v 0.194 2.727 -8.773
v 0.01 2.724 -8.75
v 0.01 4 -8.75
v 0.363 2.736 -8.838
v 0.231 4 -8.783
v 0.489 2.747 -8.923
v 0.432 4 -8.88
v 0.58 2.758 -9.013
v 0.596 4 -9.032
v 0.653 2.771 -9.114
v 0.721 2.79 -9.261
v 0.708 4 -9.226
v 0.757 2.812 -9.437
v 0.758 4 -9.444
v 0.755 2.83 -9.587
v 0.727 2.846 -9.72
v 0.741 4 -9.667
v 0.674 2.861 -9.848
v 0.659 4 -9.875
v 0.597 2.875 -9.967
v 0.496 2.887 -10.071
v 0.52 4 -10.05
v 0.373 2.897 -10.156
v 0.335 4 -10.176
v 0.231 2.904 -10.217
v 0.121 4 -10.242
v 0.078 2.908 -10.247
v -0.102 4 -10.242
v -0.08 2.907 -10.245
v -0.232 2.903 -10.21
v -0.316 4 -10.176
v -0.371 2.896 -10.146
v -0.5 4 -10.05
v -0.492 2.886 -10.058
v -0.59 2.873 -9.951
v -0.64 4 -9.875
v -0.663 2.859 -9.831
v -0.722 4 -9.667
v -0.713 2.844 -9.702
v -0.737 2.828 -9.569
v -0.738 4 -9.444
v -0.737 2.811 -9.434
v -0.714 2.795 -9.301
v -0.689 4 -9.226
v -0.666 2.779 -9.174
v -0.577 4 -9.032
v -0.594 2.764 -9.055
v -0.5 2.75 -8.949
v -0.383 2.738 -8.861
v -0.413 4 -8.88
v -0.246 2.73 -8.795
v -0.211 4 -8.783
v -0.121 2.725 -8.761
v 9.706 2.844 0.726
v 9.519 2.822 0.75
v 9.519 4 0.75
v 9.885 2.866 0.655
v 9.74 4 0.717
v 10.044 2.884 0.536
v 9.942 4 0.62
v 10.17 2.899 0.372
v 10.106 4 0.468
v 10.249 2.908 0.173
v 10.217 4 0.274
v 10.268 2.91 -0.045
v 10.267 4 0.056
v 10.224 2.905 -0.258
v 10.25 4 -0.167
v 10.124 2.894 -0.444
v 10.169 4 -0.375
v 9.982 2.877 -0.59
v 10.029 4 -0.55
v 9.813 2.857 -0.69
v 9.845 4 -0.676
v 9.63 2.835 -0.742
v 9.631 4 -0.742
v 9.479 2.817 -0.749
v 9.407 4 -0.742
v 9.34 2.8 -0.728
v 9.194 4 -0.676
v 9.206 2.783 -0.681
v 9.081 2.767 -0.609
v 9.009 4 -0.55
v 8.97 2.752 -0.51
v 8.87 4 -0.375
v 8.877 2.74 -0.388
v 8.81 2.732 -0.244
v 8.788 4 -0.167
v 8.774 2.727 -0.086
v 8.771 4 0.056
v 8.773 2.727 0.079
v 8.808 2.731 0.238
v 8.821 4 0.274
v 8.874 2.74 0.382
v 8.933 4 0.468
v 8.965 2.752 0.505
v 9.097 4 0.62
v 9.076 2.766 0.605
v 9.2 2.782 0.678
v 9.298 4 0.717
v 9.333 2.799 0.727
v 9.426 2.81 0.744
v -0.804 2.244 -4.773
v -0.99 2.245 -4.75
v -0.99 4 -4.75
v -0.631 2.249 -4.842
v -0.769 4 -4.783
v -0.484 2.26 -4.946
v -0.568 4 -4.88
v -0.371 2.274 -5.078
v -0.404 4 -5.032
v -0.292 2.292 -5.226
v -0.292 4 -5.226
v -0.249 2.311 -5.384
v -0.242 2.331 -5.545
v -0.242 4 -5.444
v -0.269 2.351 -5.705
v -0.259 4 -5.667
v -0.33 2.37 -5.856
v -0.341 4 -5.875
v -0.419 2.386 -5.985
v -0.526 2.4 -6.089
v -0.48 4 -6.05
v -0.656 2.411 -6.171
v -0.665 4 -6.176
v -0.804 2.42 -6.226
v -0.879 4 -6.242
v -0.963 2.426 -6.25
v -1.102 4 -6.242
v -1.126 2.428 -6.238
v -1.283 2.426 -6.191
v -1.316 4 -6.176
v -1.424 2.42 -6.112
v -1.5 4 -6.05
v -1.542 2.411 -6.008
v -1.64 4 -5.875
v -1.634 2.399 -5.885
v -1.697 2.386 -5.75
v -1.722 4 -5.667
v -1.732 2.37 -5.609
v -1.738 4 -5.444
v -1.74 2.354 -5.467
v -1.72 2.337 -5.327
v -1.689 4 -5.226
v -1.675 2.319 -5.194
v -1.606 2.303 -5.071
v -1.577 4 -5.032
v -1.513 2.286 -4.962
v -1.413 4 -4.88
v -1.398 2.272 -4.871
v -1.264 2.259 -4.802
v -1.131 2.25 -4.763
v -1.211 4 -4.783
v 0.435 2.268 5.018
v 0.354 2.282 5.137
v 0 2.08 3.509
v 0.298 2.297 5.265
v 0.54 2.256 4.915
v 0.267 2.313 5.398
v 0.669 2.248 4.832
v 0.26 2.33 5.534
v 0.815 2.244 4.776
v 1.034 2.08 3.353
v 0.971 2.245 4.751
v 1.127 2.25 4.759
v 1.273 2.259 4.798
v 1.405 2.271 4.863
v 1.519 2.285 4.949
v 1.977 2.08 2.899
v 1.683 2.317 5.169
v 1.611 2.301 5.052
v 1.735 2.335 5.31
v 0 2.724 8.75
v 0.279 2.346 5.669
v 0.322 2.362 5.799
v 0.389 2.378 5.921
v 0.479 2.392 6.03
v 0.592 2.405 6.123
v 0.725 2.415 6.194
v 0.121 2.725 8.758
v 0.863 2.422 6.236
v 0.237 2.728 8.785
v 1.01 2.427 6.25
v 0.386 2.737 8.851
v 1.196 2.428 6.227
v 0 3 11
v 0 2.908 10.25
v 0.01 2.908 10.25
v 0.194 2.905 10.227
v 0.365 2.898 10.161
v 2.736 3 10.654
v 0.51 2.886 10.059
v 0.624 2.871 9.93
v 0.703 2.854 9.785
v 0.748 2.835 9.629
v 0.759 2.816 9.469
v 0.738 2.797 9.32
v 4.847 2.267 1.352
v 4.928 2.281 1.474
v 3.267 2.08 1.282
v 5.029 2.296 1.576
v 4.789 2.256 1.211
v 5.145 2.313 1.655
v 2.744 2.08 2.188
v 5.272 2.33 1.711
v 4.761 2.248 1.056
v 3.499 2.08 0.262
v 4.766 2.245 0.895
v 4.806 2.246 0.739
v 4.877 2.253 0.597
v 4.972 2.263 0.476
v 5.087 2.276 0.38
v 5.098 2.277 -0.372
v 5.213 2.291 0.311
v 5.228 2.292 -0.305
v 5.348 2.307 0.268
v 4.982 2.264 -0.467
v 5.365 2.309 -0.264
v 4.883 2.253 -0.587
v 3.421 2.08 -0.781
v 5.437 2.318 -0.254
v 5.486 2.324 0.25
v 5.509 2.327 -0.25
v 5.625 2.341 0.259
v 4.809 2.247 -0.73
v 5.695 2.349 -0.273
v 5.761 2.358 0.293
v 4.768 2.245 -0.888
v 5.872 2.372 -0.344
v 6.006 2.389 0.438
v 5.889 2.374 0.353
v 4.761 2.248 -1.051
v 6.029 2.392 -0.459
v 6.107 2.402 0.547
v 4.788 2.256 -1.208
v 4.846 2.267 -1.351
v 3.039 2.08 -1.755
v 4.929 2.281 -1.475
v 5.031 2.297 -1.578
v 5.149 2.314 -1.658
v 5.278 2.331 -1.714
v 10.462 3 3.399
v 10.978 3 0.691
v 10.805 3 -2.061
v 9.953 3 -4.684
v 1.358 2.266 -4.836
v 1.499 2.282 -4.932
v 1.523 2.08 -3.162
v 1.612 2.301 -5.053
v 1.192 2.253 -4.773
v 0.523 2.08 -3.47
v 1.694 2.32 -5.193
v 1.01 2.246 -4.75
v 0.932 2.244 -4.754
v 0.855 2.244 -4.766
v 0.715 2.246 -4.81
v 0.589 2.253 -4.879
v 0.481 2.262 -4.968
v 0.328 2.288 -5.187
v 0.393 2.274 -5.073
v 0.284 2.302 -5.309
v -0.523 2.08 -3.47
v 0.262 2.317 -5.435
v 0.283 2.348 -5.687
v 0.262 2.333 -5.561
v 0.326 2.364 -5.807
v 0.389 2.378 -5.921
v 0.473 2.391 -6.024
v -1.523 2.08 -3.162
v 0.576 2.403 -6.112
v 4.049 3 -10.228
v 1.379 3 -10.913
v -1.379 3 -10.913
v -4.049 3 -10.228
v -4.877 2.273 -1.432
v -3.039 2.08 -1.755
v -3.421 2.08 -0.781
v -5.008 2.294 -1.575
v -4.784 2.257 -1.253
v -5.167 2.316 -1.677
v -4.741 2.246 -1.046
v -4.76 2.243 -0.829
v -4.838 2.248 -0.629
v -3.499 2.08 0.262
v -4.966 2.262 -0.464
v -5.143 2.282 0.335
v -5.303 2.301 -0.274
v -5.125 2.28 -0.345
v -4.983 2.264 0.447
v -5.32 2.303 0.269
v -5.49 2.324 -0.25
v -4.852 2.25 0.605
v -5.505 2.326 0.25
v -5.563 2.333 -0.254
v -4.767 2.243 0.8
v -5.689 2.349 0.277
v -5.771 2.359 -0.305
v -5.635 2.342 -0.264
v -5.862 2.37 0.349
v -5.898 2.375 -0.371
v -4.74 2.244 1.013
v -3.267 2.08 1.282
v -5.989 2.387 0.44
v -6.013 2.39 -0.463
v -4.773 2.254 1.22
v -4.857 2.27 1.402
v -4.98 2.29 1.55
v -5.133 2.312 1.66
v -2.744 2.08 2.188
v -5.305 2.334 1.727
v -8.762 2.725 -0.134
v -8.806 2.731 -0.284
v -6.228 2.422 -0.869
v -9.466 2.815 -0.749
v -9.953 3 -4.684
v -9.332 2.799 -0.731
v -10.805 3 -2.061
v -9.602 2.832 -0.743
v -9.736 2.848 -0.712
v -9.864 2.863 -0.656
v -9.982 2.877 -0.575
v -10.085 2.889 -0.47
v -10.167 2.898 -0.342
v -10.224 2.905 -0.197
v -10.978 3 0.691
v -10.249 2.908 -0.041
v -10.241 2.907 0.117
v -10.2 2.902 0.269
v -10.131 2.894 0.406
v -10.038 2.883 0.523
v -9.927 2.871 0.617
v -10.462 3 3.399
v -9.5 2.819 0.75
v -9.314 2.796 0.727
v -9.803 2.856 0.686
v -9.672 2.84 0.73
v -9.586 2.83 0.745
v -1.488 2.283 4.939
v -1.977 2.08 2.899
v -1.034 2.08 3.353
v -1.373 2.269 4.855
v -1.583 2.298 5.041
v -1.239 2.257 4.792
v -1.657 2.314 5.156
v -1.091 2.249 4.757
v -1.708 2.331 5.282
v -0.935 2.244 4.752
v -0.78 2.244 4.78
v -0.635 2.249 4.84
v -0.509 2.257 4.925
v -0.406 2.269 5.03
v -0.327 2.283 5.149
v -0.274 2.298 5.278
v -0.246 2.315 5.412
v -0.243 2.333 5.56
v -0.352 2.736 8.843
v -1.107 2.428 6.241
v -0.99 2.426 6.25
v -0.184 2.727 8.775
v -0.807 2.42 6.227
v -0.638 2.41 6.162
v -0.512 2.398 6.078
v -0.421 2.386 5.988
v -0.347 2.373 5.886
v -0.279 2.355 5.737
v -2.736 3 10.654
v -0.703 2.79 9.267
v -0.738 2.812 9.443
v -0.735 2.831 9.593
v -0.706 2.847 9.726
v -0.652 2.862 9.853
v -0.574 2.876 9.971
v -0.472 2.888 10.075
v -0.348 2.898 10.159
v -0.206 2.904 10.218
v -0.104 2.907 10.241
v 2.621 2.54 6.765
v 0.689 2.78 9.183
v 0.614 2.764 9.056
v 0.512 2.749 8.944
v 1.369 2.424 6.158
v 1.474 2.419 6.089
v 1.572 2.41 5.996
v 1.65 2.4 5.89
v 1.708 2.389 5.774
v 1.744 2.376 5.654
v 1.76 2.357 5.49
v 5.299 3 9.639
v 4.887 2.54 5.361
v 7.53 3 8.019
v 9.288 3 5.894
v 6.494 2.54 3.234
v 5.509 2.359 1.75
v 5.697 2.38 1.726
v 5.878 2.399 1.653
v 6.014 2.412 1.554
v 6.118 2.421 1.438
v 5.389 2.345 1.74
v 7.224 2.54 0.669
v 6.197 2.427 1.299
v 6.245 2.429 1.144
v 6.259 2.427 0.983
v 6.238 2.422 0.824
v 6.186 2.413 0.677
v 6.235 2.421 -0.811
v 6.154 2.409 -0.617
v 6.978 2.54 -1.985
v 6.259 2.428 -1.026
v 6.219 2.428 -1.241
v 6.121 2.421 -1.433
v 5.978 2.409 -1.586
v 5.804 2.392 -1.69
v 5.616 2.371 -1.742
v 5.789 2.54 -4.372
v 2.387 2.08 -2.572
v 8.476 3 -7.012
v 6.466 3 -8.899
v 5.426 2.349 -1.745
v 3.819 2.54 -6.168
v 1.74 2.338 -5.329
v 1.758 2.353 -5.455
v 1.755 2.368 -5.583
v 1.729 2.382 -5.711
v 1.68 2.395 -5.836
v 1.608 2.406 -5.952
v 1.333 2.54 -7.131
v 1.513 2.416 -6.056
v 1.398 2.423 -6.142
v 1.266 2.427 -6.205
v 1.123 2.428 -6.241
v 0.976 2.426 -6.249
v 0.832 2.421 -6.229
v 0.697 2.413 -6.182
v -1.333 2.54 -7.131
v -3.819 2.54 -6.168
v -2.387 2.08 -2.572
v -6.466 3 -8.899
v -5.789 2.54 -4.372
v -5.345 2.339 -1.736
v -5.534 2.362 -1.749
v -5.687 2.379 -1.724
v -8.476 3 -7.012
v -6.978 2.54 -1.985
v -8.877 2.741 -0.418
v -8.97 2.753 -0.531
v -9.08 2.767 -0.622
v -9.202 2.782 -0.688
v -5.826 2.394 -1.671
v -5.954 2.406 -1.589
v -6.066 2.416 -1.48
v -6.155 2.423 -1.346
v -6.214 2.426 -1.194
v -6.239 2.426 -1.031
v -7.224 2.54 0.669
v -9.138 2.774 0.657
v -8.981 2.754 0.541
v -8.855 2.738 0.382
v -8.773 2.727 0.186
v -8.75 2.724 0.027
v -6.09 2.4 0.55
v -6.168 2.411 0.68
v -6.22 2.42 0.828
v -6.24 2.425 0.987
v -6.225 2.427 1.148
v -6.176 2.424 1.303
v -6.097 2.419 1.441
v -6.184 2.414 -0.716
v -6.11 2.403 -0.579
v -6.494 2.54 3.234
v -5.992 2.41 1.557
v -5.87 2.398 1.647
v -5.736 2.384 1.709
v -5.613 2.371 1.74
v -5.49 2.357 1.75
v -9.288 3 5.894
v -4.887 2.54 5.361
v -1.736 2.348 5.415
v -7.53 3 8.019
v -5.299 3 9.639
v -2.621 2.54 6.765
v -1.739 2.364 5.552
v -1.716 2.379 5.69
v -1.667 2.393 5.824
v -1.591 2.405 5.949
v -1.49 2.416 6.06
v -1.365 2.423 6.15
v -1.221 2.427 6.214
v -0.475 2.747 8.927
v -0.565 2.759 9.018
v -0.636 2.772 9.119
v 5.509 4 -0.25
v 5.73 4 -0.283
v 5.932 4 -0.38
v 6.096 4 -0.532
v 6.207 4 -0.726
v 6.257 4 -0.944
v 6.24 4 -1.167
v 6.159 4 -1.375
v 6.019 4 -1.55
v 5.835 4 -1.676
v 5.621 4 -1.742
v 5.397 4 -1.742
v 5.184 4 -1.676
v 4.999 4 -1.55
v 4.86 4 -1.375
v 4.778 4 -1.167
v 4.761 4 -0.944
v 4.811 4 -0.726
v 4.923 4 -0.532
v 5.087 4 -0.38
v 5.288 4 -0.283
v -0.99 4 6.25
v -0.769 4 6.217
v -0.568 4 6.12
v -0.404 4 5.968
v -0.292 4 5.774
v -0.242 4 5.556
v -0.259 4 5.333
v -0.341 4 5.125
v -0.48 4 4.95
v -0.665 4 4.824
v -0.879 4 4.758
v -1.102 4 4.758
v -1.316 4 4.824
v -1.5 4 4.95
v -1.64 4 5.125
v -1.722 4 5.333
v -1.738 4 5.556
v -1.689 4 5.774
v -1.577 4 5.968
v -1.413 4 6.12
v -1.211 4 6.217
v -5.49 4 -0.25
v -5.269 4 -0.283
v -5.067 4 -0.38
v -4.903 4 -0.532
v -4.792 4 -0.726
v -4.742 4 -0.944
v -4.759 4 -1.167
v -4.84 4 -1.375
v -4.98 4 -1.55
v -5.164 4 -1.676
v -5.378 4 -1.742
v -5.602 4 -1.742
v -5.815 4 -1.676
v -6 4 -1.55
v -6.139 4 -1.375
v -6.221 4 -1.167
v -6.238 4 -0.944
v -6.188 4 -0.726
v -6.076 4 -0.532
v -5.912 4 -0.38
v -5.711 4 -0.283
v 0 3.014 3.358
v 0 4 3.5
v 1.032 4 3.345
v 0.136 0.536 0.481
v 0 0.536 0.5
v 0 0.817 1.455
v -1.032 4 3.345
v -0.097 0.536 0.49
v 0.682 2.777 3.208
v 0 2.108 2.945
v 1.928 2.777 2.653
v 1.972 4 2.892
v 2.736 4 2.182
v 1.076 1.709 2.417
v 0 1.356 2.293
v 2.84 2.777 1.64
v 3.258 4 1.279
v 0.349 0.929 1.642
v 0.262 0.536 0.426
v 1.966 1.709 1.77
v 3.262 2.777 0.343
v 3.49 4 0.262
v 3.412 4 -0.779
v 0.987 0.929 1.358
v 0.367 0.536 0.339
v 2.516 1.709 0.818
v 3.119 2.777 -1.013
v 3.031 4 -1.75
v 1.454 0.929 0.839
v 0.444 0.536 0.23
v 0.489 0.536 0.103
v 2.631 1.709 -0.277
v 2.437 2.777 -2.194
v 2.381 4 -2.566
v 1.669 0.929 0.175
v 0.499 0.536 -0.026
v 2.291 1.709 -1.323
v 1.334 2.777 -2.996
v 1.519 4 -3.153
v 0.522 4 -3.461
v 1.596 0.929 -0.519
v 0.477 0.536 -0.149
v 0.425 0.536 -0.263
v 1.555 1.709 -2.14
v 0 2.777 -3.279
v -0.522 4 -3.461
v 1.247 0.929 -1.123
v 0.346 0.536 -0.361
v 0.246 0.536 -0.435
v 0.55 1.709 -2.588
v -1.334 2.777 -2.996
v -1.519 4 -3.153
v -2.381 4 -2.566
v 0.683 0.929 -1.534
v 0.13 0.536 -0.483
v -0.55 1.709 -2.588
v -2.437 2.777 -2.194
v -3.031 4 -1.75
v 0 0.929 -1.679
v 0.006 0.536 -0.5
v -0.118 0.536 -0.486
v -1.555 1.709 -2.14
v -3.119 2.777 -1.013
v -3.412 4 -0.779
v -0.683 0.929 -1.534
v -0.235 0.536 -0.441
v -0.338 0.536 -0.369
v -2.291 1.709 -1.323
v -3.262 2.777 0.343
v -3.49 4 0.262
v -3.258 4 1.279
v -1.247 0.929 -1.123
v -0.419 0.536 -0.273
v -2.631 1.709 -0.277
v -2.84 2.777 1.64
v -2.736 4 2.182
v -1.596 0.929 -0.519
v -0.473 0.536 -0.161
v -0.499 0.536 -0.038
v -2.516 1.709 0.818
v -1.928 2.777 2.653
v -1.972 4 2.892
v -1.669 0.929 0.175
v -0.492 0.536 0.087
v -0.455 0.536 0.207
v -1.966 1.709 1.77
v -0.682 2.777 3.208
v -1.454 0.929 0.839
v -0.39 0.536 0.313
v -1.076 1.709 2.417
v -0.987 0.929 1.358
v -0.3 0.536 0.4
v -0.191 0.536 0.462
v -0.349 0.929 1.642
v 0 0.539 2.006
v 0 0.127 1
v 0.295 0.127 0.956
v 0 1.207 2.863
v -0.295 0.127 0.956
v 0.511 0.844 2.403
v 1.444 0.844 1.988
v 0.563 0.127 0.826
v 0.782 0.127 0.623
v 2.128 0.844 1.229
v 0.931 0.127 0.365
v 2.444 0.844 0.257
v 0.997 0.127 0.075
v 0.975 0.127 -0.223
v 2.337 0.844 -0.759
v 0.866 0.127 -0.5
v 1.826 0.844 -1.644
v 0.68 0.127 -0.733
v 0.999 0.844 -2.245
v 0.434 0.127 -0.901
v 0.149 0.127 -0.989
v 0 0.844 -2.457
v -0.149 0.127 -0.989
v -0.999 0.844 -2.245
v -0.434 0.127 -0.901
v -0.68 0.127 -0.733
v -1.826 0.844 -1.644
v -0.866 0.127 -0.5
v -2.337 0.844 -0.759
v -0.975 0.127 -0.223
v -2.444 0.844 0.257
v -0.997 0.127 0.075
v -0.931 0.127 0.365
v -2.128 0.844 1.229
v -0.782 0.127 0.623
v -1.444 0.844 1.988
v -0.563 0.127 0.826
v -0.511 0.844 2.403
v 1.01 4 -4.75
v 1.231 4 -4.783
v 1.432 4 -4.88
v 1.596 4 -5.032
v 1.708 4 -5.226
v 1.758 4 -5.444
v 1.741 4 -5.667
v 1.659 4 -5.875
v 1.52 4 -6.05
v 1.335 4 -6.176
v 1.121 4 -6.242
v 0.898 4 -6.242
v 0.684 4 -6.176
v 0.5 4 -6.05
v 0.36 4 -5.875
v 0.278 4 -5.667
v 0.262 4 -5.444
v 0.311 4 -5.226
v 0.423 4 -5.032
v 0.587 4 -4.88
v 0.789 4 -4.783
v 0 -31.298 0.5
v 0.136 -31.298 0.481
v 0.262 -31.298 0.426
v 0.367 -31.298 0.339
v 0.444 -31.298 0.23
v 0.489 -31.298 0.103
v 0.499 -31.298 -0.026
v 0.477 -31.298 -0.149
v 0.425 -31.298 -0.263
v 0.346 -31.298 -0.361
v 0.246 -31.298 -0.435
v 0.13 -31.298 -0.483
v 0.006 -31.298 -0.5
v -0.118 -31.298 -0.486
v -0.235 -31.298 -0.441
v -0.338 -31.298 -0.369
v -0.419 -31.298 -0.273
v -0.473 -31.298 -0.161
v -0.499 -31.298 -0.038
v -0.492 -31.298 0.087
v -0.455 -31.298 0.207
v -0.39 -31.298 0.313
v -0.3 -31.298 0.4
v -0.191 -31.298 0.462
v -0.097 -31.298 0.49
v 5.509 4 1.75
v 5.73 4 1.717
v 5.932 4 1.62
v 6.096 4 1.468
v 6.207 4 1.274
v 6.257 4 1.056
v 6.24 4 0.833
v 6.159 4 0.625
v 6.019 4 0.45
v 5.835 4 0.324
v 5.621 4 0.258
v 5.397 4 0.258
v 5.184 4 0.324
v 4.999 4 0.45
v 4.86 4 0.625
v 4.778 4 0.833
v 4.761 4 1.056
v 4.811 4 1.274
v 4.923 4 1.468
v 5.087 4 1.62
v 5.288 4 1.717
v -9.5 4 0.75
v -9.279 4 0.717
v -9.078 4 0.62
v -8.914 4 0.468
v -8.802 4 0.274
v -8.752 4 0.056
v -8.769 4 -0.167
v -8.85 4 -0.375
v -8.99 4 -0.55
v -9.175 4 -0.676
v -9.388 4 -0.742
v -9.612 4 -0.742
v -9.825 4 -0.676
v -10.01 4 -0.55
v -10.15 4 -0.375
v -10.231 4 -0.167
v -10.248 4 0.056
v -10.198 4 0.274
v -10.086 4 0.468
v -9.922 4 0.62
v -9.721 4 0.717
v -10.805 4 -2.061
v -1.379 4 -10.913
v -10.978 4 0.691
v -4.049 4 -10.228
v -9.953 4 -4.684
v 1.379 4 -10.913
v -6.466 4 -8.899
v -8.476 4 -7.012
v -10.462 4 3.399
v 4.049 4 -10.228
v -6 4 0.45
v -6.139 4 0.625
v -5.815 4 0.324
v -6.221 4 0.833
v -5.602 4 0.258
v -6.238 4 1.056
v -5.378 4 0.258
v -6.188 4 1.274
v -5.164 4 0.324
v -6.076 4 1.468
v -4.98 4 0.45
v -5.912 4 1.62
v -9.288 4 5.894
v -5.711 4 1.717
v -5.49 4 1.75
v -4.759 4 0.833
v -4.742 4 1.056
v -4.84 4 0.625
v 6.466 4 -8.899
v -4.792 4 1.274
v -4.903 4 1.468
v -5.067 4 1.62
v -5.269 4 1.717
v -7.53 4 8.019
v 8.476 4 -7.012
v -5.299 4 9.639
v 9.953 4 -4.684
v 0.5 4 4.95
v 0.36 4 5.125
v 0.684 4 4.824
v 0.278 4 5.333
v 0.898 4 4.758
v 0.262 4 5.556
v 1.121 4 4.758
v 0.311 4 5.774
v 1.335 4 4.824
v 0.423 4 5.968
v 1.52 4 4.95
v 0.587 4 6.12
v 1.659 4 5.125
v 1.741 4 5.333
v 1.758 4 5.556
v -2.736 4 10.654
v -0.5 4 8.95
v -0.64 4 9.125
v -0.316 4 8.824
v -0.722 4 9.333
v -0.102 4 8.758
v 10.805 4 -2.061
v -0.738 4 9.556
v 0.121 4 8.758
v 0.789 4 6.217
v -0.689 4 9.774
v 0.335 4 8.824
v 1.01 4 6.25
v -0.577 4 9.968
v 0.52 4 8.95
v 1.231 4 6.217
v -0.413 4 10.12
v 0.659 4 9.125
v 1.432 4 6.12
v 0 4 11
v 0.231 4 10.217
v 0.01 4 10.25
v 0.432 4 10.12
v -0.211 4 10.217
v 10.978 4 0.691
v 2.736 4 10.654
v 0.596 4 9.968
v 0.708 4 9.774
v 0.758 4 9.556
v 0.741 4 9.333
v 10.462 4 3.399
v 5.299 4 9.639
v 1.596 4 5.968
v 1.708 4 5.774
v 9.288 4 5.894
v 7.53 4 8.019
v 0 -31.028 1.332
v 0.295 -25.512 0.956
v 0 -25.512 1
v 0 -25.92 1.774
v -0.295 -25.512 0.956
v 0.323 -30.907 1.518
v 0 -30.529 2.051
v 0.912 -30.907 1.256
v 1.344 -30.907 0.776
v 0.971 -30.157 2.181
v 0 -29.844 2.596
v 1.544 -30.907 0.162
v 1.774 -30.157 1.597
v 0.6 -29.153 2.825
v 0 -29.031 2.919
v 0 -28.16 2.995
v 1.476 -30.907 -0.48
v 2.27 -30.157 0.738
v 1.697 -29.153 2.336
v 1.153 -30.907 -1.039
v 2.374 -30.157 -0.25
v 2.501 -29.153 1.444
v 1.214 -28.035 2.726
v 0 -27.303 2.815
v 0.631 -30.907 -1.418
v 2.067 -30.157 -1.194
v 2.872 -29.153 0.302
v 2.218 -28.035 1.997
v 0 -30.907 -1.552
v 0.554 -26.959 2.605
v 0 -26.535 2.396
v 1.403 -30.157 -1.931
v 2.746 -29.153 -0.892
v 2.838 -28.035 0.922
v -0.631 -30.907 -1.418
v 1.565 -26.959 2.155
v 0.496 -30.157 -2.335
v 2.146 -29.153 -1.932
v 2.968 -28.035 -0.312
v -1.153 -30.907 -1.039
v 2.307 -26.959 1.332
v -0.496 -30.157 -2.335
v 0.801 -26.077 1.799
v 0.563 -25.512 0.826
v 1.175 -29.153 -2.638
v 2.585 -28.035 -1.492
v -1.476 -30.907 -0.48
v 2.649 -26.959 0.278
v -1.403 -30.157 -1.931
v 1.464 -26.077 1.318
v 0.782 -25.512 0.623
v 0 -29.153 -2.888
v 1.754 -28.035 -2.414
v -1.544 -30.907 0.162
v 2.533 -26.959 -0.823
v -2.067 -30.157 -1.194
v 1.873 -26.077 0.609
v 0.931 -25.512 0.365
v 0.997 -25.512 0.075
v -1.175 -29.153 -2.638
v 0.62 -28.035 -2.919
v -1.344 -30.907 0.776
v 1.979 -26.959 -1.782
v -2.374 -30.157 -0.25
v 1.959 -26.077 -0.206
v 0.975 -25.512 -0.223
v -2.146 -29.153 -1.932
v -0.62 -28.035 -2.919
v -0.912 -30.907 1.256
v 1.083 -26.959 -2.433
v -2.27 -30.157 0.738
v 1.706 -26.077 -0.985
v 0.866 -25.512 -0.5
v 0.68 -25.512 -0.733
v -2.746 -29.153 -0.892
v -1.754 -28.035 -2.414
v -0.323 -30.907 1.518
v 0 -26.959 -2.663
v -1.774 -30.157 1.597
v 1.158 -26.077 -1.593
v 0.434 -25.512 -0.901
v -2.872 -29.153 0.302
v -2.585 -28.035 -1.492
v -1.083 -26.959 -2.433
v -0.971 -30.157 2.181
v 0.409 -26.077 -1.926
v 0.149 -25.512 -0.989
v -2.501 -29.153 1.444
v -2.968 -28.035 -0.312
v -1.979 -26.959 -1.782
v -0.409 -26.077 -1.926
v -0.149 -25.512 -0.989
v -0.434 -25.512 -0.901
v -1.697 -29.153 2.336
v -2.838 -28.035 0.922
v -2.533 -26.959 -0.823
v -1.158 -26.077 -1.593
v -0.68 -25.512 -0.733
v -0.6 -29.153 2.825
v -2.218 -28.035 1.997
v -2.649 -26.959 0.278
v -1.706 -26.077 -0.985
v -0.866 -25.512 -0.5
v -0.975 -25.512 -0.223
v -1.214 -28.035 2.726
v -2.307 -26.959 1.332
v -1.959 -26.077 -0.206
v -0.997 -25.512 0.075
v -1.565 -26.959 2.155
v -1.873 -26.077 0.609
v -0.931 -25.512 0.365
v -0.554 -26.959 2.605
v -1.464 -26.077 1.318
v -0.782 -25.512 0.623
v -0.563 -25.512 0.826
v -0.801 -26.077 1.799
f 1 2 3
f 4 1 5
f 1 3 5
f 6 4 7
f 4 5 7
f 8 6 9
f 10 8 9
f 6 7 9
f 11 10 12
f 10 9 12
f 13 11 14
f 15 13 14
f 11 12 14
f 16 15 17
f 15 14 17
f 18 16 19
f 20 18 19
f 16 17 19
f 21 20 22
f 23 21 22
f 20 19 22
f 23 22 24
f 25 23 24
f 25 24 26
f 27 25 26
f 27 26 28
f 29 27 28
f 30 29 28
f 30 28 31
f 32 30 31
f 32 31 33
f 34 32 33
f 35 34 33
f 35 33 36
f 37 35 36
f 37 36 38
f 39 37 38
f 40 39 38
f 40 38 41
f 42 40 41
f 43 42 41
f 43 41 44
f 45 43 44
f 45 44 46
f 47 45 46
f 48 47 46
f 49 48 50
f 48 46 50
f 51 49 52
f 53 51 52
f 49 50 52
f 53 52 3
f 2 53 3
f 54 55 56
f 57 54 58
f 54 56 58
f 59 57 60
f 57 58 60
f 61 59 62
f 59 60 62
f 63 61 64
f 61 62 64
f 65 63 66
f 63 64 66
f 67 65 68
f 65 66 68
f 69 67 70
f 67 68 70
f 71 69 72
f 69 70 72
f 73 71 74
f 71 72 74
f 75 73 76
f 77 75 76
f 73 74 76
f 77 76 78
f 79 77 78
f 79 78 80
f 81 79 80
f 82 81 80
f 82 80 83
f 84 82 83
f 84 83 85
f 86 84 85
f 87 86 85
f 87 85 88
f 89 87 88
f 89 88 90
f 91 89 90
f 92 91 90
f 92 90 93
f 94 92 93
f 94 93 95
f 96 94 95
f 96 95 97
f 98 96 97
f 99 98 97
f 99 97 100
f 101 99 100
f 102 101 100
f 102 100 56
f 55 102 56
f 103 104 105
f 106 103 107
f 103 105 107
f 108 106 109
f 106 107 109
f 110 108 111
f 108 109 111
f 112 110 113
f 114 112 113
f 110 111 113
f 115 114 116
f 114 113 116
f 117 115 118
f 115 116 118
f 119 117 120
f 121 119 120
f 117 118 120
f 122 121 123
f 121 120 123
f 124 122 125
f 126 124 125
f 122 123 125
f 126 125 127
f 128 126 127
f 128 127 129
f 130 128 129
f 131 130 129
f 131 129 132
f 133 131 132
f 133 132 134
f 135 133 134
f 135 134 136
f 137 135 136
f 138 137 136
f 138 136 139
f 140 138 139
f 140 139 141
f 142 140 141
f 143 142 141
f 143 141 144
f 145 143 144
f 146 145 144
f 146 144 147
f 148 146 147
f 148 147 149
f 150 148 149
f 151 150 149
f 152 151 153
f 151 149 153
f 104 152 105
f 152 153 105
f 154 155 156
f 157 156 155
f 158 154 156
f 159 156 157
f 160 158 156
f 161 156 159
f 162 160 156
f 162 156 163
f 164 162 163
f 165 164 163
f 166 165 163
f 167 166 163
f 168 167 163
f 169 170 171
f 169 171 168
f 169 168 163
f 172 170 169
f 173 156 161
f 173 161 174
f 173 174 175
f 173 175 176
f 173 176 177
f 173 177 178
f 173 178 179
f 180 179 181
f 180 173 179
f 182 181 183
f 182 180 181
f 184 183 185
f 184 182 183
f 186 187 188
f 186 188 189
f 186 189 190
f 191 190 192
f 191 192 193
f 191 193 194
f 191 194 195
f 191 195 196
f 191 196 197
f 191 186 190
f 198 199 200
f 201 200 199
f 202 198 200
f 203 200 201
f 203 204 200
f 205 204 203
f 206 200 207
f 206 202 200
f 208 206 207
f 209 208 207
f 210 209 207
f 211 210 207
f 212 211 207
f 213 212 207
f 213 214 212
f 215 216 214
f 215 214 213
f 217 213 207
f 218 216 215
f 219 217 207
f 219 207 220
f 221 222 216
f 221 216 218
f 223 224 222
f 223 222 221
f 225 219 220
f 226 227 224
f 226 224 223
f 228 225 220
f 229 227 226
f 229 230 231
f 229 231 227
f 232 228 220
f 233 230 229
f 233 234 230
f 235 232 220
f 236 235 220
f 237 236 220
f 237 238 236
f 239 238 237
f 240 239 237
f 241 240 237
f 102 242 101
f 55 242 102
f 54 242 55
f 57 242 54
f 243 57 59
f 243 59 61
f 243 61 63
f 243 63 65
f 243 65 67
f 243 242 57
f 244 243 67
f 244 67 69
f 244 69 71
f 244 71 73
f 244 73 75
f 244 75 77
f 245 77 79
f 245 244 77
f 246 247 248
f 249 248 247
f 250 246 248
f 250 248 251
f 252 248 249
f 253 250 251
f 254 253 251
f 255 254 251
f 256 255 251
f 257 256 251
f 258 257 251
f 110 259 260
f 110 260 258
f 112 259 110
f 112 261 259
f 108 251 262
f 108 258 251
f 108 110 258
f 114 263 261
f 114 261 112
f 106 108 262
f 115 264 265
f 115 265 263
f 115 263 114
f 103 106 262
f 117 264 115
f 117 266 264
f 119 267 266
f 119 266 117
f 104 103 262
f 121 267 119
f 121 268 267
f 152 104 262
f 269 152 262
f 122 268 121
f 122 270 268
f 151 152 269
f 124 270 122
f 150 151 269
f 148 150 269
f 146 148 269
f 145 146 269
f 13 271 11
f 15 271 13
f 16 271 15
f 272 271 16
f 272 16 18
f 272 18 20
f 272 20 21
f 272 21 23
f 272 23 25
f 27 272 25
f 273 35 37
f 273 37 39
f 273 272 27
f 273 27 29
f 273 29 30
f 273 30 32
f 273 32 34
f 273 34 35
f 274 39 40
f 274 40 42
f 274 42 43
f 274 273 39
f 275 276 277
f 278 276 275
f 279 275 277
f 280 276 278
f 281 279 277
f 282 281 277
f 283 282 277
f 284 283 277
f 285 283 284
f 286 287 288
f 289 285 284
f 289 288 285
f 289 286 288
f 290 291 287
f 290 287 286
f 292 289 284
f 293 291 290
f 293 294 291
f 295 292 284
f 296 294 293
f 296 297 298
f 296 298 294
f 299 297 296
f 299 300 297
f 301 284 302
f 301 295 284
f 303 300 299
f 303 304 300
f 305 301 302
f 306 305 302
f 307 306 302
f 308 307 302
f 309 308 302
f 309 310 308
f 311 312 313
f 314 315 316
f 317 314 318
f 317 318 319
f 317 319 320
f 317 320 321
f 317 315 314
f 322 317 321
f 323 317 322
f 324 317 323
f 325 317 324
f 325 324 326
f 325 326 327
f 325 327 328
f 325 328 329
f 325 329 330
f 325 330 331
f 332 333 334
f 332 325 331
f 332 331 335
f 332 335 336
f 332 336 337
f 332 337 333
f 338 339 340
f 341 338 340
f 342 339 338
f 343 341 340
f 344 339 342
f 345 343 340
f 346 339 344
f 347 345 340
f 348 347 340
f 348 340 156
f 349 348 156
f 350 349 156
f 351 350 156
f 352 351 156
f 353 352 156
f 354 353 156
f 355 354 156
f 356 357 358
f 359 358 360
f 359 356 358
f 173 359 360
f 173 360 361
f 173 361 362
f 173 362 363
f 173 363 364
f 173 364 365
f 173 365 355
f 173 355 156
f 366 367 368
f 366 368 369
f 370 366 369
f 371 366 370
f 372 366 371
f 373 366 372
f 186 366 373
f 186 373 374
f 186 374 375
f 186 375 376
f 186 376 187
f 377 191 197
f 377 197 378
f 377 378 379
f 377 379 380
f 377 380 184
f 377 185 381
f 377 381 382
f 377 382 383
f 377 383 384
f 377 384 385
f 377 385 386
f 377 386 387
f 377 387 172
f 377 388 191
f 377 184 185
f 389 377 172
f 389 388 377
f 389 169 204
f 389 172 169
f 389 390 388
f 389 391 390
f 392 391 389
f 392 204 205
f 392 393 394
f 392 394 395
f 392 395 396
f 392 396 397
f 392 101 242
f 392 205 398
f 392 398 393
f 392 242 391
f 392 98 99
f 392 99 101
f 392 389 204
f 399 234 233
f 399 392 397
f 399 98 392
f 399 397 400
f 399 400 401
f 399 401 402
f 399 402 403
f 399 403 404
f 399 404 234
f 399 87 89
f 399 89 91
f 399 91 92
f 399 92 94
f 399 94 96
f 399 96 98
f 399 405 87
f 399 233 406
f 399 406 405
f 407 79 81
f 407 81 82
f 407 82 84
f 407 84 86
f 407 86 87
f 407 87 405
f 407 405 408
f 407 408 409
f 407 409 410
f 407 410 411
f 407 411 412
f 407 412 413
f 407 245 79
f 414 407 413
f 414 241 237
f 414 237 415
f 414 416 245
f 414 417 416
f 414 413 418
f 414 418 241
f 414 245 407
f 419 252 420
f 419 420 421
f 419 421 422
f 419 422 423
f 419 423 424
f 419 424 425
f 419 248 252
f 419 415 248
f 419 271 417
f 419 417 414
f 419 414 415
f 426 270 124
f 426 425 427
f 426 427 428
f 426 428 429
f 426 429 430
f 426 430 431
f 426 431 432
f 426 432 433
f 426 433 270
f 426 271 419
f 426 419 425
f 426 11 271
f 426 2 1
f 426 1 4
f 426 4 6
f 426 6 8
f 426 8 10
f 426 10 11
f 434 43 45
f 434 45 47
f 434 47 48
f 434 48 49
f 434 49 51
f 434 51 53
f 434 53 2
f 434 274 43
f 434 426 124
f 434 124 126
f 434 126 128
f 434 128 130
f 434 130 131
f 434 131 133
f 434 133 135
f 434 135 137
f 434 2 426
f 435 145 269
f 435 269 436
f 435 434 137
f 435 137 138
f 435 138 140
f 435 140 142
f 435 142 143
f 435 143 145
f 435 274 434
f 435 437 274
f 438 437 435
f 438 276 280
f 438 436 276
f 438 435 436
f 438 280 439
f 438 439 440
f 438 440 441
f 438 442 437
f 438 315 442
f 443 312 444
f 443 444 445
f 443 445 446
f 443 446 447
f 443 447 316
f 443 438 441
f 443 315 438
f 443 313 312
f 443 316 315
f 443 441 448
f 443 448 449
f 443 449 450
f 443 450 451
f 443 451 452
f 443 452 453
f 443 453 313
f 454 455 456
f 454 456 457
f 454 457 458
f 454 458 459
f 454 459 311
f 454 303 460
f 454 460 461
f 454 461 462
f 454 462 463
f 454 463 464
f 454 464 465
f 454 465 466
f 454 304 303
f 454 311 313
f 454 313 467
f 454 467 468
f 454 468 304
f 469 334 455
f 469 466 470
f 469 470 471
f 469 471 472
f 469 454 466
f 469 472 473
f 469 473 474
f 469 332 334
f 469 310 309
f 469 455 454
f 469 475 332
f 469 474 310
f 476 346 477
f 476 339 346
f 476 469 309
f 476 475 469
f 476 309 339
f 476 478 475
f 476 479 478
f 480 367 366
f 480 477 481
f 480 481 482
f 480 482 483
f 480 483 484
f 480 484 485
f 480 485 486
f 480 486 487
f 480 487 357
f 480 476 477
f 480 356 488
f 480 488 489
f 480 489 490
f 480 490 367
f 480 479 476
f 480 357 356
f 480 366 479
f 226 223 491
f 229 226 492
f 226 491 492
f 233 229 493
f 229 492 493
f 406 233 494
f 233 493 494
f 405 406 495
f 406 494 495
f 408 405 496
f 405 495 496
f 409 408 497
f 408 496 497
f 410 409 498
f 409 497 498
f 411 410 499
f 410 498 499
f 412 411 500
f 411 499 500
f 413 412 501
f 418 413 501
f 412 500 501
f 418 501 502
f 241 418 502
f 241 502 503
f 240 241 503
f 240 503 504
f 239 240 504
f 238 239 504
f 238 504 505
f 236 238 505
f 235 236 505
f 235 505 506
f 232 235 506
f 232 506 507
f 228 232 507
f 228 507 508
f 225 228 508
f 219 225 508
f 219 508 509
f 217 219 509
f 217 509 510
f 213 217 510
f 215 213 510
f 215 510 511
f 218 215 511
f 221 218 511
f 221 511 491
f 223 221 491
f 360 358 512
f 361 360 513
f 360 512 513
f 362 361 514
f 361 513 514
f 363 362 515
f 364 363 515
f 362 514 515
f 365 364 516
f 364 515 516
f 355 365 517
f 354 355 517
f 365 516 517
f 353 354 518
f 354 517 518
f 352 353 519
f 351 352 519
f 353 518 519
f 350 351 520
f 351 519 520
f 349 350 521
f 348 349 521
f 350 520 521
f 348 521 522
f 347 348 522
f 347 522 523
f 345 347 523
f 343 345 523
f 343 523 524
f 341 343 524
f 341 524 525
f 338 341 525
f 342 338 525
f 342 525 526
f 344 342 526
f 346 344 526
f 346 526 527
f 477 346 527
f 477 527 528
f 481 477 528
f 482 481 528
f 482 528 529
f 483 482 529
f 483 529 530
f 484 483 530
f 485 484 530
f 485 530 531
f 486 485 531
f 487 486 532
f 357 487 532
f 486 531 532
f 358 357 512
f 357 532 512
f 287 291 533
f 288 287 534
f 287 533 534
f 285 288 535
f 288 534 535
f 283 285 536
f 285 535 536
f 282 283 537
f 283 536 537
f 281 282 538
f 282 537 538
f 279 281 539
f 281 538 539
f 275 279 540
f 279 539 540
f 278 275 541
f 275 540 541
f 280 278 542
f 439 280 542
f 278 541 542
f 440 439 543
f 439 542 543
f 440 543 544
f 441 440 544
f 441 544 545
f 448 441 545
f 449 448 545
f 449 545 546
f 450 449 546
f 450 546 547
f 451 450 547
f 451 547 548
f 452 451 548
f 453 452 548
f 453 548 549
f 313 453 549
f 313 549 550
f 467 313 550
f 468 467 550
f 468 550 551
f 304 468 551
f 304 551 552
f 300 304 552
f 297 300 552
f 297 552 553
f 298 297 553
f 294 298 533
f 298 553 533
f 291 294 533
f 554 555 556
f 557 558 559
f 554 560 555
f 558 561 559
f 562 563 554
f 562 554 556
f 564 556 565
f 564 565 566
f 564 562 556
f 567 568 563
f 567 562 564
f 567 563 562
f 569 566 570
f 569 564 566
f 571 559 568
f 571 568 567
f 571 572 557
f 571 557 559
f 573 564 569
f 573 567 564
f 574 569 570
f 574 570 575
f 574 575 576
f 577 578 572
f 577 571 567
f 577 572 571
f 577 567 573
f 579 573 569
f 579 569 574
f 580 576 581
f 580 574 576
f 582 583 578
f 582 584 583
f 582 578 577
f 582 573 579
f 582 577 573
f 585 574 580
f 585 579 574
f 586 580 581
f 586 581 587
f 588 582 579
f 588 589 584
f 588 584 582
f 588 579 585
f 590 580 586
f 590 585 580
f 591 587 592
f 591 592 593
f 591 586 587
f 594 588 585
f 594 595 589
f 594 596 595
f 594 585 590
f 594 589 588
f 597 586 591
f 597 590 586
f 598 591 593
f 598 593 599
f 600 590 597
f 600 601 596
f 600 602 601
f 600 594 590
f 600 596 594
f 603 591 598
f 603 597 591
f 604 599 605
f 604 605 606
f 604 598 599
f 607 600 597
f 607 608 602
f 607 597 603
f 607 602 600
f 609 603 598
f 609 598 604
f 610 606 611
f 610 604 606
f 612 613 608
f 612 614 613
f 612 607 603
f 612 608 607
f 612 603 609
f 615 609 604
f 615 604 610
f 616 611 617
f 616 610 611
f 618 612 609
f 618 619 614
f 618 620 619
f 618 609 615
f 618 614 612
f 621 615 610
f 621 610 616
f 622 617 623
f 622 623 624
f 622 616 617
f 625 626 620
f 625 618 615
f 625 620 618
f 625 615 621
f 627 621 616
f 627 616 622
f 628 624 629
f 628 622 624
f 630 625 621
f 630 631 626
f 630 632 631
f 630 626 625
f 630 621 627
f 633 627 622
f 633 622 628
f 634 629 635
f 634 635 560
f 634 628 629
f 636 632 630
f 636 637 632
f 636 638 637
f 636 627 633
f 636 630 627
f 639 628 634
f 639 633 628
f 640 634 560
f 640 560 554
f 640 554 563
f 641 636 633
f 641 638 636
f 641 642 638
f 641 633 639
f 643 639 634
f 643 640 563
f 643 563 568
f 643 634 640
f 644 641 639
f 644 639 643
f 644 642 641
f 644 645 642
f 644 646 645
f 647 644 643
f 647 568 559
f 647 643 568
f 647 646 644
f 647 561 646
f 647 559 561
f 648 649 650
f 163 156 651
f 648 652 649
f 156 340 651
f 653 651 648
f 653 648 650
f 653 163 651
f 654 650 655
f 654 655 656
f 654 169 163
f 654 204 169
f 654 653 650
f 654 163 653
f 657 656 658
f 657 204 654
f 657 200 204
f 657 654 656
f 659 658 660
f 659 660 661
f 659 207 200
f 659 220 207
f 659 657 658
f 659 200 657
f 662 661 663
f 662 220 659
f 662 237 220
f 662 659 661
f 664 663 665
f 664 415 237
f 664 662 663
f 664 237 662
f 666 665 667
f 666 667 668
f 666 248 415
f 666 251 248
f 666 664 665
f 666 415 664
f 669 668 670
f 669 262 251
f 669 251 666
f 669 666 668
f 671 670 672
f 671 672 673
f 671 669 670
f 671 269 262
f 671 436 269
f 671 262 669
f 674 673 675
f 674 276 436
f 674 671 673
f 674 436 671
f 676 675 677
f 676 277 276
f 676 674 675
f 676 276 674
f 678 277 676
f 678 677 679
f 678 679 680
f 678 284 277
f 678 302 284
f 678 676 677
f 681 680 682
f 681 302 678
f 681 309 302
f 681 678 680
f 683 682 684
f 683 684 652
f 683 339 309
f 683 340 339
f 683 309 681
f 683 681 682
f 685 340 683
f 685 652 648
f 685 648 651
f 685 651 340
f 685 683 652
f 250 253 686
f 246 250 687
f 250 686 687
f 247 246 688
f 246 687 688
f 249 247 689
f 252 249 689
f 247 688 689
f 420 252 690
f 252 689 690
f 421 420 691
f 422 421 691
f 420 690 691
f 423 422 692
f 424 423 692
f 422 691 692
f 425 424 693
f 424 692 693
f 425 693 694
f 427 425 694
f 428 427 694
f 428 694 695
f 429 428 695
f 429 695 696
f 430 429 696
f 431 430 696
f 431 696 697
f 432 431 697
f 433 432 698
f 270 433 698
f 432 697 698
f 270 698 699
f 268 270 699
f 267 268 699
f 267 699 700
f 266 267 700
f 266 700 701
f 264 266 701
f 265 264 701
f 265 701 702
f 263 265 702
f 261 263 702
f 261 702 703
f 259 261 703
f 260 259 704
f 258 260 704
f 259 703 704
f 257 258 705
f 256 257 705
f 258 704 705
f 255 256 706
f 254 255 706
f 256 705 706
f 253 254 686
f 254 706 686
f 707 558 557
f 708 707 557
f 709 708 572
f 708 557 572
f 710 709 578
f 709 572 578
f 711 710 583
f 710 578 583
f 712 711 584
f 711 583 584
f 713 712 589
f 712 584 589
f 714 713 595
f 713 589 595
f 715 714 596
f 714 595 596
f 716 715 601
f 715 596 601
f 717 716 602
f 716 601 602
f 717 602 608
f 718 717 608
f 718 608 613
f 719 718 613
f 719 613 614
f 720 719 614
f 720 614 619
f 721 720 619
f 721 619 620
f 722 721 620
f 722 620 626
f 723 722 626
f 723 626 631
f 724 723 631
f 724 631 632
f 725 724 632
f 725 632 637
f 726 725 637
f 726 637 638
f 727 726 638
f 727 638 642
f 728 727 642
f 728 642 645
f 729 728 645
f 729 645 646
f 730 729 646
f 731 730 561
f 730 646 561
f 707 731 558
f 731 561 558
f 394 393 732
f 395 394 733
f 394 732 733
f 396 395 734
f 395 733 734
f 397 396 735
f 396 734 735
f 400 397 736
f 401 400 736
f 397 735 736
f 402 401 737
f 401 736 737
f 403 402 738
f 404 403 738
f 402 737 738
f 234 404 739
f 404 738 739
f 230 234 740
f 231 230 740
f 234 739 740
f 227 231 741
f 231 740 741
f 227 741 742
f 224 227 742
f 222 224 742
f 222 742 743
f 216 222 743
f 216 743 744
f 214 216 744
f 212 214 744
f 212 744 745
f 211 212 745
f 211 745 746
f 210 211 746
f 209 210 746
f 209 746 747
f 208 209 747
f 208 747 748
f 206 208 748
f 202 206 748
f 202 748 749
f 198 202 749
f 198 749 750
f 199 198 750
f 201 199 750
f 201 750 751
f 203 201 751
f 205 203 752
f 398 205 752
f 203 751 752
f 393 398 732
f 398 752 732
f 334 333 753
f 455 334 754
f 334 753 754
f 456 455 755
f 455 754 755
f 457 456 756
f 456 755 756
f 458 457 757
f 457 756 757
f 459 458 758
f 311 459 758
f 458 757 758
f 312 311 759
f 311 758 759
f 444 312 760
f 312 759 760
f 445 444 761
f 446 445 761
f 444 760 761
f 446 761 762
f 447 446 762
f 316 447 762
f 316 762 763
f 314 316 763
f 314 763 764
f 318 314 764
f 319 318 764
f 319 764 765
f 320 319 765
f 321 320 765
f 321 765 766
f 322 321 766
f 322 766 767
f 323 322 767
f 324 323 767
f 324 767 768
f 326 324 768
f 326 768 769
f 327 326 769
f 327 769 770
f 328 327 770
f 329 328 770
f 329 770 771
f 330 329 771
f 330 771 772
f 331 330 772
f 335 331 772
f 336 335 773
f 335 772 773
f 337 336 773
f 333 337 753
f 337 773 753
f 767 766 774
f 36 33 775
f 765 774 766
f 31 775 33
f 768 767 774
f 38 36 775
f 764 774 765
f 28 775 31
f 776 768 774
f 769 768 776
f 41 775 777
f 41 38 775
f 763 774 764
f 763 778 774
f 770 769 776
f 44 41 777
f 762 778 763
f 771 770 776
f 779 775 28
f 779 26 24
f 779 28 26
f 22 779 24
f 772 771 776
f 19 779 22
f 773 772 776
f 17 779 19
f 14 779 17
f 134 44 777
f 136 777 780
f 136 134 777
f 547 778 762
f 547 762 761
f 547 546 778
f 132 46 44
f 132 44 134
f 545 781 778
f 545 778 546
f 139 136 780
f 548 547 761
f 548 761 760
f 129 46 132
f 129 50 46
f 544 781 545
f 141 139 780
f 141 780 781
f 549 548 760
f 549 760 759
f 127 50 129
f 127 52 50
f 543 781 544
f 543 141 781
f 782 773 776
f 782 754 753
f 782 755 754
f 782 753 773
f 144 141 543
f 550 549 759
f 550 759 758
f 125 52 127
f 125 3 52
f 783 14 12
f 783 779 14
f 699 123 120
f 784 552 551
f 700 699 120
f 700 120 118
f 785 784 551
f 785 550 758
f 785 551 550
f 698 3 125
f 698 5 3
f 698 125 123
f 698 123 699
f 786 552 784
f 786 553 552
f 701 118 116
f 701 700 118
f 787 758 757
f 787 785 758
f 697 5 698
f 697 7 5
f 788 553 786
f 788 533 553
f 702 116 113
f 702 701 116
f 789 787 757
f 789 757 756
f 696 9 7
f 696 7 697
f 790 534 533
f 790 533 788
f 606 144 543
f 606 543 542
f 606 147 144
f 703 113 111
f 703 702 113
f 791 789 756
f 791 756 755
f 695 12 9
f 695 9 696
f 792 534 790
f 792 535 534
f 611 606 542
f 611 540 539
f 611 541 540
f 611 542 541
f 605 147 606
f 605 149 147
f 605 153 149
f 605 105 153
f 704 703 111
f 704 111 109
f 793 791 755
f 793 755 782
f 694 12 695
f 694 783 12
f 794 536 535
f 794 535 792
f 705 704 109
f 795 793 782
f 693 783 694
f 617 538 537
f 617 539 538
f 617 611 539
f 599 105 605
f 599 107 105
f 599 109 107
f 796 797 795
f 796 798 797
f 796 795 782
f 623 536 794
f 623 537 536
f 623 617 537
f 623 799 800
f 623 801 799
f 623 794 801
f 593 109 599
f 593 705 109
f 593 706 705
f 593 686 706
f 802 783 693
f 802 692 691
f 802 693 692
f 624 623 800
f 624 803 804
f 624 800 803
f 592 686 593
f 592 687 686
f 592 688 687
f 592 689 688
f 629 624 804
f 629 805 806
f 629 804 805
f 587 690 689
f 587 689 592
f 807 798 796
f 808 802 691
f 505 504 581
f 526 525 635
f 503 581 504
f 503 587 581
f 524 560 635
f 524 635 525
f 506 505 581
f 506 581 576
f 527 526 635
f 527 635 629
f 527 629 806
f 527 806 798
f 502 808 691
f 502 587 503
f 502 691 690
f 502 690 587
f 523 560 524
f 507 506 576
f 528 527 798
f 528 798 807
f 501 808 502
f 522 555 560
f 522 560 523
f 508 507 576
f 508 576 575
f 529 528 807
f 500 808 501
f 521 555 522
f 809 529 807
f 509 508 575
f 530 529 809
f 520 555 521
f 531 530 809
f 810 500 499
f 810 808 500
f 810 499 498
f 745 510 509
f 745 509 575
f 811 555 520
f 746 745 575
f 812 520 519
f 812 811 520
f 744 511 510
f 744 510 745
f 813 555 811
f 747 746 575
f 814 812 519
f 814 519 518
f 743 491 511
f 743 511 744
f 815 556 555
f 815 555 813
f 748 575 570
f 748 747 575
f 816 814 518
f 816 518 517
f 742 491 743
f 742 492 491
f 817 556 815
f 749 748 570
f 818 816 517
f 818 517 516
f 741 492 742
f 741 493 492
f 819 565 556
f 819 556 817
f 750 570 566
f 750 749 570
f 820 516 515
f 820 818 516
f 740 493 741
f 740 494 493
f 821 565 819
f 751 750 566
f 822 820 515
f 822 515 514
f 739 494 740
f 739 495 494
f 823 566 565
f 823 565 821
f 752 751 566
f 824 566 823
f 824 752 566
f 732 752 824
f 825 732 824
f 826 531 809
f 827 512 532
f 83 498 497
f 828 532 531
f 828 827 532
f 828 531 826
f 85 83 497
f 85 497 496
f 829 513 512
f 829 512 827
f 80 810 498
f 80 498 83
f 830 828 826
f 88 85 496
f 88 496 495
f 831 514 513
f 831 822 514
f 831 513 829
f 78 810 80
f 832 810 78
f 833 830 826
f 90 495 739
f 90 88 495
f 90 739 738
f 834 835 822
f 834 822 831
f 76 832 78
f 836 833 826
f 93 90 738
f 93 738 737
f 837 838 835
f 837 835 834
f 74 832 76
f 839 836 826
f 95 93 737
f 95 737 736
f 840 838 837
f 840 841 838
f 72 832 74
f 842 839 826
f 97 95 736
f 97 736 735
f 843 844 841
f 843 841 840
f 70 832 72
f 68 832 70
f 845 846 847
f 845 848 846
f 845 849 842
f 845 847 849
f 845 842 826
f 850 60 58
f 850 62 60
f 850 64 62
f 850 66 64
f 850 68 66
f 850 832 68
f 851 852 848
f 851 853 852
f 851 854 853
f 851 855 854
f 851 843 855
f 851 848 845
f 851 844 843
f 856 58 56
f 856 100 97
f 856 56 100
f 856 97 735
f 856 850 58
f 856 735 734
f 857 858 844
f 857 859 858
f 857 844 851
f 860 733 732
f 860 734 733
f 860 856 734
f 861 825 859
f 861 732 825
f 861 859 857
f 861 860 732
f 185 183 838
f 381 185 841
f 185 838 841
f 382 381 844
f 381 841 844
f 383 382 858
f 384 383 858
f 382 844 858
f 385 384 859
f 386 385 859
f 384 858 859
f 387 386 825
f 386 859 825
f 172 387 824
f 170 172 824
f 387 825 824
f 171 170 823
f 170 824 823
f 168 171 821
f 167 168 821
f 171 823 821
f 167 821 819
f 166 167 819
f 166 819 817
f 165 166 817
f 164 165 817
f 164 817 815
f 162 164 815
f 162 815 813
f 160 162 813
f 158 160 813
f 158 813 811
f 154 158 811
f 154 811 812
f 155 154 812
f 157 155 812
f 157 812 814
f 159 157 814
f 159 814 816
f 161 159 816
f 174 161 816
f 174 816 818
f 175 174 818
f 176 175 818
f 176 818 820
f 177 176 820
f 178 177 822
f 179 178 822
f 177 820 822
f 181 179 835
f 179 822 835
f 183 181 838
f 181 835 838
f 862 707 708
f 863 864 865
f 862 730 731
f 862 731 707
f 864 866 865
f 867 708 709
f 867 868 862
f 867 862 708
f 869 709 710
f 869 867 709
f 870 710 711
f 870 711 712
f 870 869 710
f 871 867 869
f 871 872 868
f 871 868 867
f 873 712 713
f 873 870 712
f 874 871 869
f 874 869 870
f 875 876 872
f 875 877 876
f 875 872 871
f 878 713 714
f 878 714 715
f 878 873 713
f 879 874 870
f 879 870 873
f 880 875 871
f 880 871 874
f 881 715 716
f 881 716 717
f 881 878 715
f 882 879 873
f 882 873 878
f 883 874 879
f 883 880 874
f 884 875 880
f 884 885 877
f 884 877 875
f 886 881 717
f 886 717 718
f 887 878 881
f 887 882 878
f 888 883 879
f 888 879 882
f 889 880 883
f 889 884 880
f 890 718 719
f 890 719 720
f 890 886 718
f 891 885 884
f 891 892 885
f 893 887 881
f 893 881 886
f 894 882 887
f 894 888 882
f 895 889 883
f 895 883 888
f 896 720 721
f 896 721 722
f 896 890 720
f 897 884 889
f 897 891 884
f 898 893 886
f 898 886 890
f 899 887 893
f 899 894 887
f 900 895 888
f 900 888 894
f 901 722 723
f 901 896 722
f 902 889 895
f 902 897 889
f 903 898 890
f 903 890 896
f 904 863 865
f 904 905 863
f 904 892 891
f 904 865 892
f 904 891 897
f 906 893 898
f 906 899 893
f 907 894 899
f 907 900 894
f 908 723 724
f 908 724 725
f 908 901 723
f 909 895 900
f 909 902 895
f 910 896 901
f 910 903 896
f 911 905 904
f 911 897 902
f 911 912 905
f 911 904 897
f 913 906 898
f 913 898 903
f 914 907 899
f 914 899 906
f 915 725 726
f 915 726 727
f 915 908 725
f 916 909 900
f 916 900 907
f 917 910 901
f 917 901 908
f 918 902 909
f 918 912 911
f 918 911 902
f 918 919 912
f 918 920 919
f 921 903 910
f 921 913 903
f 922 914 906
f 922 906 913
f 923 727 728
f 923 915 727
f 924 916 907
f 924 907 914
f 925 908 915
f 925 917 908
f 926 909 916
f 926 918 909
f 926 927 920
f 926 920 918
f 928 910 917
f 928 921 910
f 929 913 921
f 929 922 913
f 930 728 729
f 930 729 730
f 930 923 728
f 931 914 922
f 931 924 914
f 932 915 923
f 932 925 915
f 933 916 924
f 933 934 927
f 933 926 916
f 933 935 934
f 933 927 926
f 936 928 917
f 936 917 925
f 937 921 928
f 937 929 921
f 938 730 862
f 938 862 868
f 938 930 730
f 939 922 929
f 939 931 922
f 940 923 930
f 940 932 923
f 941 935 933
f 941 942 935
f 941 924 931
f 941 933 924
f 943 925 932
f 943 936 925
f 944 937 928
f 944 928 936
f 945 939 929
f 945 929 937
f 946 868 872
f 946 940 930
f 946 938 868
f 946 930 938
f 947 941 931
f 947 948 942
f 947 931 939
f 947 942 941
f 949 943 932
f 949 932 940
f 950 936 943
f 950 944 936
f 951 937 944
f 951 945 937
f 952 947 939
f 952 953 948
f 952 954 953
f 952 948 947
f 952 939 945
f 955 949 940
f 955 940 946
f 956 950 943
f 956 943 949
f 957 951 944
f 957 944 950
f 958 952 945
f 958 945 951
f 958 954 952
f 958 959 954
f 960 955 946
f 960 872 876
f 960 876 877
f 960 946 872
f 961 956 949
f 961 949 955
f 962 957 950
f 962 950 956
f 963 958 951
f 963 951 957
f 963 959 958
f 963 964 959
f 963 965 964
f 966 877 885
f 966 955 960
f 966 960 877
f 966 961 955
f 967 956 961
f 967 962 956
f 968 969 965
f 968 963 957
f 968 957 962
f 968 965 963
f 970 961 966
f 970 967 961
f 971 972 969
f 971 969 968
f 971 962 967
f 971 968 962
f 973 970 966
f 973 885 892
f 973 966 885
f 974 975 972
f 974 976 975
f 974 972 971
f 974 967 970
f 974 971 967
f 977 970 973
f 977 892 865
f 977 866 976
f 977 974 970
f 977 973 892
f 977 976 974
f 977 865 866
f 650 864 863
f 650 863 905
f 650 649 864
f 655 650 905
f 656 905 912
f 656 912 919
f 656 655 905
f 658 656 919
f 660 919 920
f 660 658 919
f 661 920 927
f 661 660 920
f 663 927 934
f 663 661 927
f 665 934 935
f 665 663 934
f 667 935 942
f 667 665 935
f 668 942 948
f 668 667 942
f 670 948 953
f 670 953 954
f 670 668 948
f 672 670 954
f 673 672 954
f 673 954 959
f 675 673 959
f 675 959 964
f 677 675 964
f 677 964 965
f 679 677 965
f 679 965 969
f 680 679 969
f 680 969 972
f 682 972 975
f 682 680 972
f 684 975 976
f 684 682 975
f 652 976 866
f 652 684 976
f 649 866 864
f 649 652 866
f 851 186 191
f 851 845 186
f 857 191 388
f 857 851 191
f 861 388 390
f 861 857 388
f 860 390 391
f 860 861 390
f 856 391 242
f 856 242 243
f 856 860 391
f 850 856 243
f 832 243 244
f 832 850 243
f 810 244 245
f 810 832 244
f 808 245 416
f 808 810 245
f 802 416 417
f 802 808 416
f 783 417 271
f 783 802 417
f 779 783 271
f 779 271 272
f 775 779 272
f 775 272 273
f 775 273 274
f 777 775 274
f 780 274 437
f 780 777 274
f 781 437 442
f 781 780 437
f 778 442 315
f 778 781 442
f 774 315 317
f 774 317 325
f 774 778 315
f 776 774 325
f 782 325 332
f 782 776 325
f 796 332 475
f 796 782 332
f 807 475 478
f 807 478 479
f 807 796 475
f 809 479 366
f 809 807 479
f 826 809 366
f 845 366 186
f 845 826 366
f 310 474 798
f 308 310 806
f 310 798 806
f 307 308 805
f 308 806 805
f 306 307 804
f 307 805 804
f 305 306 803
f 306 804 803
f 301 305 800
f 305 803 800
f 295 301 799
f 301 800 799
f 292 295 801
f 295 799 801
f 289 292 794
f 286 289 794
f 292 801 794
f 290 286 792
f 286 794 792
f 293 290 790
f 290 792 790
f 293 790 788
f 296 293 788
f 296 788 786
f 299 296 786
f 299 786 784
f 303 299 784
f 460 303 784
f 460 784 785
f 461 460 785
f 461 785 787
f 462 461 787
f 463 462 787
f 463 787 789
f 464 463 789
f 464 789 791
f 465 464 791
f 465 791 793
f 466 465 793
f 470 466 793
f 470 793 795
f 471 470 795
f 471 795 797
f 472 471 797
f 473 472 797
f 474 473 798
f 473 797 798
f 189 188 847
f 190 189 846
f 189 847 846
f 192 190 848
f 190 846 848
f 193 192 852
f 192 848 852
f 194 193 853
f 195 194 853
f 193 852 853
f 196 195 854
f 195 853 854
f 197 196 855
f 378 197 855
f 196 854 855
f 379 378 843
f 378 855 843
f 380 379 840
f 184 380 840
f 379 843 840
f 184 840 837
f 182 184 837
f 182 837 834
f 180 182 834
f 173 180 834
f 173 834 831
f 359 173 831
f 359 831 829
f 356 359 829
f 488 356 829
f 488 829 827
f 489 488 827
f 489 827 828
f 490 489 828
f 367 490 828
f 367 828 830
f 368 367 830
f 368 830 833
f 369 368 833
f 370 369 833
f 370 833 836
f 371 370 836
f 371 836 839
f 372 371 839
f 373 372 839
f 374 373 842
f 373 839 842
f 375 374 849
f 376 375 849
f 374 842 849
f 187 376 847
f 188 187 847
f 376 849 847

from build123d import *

# Parameters (mm, degrees)
SKETCH2_R          = 0.75
SKETCH2_R_2        = 0.5
CUT_EXTRUDE1_DEPTH = 40


with BuildPart() as part:
    # Sketch1 → Revolve1 (revolve)
    with BuildSketch(Plane(origin=(0, 0, 0), x_dir=(0, 0, -1), z_dir=(1, 0, 0))):
        with BuildLine():
            ThreePointArc((-3.5, 4), (-2.474873734, 1.525126266), (0, 0.5))
            Line((0, 0.5), (0, 0))
            Line((0, 0), (0, -25.34))
            Line((0, -25.34), (0, -31.34))
            ThreePointArc((0, -31.34), (-2.956795679, -28.847305936), (-1, -25.511572875))
            Line((-1, -25.511572875), (-1, 0.127016654))
            ThreePointArc((-1, 0.127016654), (-2.457034335, 0.843580783), (-3.50920881, 2.080246493))
            Line((-3.50920881, 2.080246493), (-11, 3))
            Line((-11, 3), (-11, 4))
            Line((-11, 4), (-4, 4))
            Line((-4, 4), (-3.5, 4))
        make_face()
    revolve(axis=Axis((0, 10.634252877, 0), (0, 1, 0)))

    # Sketch2 → Cut-Extrude1 (cut)
    with BuildSketch(Plane(origin=(0, 4, 0), x_dir=(1, 0, 0), z_dir=(0, 1, 0))):
        with Locations(Location((-5.489872585, -1, 0), (0, 0, 270))):
            Circle(SKETCH2_R)
        with Locations(Location((-9.5, 0, 0), (0, 0, 270))):
            Circle(SKETCH2_R)
        with Locations(Location((0.00965171, -9.5, 0), (0, 0, 270))):
            Circle(SKETCH2_R)
        with Locations(Location((-0.990356221, -5.500003966, 0), (0, 0, 270))):
            Circle(SKETCH2_R)
        with Locations(Location((1.009643779, -5.5, 0), (0, 0, 270))):
            Circle(SKETCH2_R)
        with Locations(Location((5.509142299, -0.999978192, 0), (0, 0, 270))):
            Circle(SKETCH2_R)
        with Locations(Location((5.509134368, 1.000021808, 0), (0, 0, 270))):
            Circle(SKETCH2_R)
        with Locations(Location((9.519265749, 3.7711e-05, 0), (0, 0, 270))):
            Circle(SKETCH2_R)
        with Locations(Location((1.009643779, 5.5, 0), (0, 0, 270))):
            Circle(SKETCH2_R)
        with Locations(Location((-0.990356221, 5.500003966, 0), (0, 0, 270))):
            Circle(SKETCH2_R)
        with Locations(Location((0.00965171, 9.5, 0), (0, 0, 270))):
            Circle(SKETCH2_R)
        with Locations(Location((0, 0, 0), (0, 0, 270))):
            Circle(SKETCH2_R_2)
        with Locations(Location((-5.489872585, 1, 0), (0, 0, 270))):
            Circle(SKETCH2_R)
    extrude(amount=-CUT_EXTRUDE1_DEPTH, mode=Mode.SUBTRACT)


solid = part.part
